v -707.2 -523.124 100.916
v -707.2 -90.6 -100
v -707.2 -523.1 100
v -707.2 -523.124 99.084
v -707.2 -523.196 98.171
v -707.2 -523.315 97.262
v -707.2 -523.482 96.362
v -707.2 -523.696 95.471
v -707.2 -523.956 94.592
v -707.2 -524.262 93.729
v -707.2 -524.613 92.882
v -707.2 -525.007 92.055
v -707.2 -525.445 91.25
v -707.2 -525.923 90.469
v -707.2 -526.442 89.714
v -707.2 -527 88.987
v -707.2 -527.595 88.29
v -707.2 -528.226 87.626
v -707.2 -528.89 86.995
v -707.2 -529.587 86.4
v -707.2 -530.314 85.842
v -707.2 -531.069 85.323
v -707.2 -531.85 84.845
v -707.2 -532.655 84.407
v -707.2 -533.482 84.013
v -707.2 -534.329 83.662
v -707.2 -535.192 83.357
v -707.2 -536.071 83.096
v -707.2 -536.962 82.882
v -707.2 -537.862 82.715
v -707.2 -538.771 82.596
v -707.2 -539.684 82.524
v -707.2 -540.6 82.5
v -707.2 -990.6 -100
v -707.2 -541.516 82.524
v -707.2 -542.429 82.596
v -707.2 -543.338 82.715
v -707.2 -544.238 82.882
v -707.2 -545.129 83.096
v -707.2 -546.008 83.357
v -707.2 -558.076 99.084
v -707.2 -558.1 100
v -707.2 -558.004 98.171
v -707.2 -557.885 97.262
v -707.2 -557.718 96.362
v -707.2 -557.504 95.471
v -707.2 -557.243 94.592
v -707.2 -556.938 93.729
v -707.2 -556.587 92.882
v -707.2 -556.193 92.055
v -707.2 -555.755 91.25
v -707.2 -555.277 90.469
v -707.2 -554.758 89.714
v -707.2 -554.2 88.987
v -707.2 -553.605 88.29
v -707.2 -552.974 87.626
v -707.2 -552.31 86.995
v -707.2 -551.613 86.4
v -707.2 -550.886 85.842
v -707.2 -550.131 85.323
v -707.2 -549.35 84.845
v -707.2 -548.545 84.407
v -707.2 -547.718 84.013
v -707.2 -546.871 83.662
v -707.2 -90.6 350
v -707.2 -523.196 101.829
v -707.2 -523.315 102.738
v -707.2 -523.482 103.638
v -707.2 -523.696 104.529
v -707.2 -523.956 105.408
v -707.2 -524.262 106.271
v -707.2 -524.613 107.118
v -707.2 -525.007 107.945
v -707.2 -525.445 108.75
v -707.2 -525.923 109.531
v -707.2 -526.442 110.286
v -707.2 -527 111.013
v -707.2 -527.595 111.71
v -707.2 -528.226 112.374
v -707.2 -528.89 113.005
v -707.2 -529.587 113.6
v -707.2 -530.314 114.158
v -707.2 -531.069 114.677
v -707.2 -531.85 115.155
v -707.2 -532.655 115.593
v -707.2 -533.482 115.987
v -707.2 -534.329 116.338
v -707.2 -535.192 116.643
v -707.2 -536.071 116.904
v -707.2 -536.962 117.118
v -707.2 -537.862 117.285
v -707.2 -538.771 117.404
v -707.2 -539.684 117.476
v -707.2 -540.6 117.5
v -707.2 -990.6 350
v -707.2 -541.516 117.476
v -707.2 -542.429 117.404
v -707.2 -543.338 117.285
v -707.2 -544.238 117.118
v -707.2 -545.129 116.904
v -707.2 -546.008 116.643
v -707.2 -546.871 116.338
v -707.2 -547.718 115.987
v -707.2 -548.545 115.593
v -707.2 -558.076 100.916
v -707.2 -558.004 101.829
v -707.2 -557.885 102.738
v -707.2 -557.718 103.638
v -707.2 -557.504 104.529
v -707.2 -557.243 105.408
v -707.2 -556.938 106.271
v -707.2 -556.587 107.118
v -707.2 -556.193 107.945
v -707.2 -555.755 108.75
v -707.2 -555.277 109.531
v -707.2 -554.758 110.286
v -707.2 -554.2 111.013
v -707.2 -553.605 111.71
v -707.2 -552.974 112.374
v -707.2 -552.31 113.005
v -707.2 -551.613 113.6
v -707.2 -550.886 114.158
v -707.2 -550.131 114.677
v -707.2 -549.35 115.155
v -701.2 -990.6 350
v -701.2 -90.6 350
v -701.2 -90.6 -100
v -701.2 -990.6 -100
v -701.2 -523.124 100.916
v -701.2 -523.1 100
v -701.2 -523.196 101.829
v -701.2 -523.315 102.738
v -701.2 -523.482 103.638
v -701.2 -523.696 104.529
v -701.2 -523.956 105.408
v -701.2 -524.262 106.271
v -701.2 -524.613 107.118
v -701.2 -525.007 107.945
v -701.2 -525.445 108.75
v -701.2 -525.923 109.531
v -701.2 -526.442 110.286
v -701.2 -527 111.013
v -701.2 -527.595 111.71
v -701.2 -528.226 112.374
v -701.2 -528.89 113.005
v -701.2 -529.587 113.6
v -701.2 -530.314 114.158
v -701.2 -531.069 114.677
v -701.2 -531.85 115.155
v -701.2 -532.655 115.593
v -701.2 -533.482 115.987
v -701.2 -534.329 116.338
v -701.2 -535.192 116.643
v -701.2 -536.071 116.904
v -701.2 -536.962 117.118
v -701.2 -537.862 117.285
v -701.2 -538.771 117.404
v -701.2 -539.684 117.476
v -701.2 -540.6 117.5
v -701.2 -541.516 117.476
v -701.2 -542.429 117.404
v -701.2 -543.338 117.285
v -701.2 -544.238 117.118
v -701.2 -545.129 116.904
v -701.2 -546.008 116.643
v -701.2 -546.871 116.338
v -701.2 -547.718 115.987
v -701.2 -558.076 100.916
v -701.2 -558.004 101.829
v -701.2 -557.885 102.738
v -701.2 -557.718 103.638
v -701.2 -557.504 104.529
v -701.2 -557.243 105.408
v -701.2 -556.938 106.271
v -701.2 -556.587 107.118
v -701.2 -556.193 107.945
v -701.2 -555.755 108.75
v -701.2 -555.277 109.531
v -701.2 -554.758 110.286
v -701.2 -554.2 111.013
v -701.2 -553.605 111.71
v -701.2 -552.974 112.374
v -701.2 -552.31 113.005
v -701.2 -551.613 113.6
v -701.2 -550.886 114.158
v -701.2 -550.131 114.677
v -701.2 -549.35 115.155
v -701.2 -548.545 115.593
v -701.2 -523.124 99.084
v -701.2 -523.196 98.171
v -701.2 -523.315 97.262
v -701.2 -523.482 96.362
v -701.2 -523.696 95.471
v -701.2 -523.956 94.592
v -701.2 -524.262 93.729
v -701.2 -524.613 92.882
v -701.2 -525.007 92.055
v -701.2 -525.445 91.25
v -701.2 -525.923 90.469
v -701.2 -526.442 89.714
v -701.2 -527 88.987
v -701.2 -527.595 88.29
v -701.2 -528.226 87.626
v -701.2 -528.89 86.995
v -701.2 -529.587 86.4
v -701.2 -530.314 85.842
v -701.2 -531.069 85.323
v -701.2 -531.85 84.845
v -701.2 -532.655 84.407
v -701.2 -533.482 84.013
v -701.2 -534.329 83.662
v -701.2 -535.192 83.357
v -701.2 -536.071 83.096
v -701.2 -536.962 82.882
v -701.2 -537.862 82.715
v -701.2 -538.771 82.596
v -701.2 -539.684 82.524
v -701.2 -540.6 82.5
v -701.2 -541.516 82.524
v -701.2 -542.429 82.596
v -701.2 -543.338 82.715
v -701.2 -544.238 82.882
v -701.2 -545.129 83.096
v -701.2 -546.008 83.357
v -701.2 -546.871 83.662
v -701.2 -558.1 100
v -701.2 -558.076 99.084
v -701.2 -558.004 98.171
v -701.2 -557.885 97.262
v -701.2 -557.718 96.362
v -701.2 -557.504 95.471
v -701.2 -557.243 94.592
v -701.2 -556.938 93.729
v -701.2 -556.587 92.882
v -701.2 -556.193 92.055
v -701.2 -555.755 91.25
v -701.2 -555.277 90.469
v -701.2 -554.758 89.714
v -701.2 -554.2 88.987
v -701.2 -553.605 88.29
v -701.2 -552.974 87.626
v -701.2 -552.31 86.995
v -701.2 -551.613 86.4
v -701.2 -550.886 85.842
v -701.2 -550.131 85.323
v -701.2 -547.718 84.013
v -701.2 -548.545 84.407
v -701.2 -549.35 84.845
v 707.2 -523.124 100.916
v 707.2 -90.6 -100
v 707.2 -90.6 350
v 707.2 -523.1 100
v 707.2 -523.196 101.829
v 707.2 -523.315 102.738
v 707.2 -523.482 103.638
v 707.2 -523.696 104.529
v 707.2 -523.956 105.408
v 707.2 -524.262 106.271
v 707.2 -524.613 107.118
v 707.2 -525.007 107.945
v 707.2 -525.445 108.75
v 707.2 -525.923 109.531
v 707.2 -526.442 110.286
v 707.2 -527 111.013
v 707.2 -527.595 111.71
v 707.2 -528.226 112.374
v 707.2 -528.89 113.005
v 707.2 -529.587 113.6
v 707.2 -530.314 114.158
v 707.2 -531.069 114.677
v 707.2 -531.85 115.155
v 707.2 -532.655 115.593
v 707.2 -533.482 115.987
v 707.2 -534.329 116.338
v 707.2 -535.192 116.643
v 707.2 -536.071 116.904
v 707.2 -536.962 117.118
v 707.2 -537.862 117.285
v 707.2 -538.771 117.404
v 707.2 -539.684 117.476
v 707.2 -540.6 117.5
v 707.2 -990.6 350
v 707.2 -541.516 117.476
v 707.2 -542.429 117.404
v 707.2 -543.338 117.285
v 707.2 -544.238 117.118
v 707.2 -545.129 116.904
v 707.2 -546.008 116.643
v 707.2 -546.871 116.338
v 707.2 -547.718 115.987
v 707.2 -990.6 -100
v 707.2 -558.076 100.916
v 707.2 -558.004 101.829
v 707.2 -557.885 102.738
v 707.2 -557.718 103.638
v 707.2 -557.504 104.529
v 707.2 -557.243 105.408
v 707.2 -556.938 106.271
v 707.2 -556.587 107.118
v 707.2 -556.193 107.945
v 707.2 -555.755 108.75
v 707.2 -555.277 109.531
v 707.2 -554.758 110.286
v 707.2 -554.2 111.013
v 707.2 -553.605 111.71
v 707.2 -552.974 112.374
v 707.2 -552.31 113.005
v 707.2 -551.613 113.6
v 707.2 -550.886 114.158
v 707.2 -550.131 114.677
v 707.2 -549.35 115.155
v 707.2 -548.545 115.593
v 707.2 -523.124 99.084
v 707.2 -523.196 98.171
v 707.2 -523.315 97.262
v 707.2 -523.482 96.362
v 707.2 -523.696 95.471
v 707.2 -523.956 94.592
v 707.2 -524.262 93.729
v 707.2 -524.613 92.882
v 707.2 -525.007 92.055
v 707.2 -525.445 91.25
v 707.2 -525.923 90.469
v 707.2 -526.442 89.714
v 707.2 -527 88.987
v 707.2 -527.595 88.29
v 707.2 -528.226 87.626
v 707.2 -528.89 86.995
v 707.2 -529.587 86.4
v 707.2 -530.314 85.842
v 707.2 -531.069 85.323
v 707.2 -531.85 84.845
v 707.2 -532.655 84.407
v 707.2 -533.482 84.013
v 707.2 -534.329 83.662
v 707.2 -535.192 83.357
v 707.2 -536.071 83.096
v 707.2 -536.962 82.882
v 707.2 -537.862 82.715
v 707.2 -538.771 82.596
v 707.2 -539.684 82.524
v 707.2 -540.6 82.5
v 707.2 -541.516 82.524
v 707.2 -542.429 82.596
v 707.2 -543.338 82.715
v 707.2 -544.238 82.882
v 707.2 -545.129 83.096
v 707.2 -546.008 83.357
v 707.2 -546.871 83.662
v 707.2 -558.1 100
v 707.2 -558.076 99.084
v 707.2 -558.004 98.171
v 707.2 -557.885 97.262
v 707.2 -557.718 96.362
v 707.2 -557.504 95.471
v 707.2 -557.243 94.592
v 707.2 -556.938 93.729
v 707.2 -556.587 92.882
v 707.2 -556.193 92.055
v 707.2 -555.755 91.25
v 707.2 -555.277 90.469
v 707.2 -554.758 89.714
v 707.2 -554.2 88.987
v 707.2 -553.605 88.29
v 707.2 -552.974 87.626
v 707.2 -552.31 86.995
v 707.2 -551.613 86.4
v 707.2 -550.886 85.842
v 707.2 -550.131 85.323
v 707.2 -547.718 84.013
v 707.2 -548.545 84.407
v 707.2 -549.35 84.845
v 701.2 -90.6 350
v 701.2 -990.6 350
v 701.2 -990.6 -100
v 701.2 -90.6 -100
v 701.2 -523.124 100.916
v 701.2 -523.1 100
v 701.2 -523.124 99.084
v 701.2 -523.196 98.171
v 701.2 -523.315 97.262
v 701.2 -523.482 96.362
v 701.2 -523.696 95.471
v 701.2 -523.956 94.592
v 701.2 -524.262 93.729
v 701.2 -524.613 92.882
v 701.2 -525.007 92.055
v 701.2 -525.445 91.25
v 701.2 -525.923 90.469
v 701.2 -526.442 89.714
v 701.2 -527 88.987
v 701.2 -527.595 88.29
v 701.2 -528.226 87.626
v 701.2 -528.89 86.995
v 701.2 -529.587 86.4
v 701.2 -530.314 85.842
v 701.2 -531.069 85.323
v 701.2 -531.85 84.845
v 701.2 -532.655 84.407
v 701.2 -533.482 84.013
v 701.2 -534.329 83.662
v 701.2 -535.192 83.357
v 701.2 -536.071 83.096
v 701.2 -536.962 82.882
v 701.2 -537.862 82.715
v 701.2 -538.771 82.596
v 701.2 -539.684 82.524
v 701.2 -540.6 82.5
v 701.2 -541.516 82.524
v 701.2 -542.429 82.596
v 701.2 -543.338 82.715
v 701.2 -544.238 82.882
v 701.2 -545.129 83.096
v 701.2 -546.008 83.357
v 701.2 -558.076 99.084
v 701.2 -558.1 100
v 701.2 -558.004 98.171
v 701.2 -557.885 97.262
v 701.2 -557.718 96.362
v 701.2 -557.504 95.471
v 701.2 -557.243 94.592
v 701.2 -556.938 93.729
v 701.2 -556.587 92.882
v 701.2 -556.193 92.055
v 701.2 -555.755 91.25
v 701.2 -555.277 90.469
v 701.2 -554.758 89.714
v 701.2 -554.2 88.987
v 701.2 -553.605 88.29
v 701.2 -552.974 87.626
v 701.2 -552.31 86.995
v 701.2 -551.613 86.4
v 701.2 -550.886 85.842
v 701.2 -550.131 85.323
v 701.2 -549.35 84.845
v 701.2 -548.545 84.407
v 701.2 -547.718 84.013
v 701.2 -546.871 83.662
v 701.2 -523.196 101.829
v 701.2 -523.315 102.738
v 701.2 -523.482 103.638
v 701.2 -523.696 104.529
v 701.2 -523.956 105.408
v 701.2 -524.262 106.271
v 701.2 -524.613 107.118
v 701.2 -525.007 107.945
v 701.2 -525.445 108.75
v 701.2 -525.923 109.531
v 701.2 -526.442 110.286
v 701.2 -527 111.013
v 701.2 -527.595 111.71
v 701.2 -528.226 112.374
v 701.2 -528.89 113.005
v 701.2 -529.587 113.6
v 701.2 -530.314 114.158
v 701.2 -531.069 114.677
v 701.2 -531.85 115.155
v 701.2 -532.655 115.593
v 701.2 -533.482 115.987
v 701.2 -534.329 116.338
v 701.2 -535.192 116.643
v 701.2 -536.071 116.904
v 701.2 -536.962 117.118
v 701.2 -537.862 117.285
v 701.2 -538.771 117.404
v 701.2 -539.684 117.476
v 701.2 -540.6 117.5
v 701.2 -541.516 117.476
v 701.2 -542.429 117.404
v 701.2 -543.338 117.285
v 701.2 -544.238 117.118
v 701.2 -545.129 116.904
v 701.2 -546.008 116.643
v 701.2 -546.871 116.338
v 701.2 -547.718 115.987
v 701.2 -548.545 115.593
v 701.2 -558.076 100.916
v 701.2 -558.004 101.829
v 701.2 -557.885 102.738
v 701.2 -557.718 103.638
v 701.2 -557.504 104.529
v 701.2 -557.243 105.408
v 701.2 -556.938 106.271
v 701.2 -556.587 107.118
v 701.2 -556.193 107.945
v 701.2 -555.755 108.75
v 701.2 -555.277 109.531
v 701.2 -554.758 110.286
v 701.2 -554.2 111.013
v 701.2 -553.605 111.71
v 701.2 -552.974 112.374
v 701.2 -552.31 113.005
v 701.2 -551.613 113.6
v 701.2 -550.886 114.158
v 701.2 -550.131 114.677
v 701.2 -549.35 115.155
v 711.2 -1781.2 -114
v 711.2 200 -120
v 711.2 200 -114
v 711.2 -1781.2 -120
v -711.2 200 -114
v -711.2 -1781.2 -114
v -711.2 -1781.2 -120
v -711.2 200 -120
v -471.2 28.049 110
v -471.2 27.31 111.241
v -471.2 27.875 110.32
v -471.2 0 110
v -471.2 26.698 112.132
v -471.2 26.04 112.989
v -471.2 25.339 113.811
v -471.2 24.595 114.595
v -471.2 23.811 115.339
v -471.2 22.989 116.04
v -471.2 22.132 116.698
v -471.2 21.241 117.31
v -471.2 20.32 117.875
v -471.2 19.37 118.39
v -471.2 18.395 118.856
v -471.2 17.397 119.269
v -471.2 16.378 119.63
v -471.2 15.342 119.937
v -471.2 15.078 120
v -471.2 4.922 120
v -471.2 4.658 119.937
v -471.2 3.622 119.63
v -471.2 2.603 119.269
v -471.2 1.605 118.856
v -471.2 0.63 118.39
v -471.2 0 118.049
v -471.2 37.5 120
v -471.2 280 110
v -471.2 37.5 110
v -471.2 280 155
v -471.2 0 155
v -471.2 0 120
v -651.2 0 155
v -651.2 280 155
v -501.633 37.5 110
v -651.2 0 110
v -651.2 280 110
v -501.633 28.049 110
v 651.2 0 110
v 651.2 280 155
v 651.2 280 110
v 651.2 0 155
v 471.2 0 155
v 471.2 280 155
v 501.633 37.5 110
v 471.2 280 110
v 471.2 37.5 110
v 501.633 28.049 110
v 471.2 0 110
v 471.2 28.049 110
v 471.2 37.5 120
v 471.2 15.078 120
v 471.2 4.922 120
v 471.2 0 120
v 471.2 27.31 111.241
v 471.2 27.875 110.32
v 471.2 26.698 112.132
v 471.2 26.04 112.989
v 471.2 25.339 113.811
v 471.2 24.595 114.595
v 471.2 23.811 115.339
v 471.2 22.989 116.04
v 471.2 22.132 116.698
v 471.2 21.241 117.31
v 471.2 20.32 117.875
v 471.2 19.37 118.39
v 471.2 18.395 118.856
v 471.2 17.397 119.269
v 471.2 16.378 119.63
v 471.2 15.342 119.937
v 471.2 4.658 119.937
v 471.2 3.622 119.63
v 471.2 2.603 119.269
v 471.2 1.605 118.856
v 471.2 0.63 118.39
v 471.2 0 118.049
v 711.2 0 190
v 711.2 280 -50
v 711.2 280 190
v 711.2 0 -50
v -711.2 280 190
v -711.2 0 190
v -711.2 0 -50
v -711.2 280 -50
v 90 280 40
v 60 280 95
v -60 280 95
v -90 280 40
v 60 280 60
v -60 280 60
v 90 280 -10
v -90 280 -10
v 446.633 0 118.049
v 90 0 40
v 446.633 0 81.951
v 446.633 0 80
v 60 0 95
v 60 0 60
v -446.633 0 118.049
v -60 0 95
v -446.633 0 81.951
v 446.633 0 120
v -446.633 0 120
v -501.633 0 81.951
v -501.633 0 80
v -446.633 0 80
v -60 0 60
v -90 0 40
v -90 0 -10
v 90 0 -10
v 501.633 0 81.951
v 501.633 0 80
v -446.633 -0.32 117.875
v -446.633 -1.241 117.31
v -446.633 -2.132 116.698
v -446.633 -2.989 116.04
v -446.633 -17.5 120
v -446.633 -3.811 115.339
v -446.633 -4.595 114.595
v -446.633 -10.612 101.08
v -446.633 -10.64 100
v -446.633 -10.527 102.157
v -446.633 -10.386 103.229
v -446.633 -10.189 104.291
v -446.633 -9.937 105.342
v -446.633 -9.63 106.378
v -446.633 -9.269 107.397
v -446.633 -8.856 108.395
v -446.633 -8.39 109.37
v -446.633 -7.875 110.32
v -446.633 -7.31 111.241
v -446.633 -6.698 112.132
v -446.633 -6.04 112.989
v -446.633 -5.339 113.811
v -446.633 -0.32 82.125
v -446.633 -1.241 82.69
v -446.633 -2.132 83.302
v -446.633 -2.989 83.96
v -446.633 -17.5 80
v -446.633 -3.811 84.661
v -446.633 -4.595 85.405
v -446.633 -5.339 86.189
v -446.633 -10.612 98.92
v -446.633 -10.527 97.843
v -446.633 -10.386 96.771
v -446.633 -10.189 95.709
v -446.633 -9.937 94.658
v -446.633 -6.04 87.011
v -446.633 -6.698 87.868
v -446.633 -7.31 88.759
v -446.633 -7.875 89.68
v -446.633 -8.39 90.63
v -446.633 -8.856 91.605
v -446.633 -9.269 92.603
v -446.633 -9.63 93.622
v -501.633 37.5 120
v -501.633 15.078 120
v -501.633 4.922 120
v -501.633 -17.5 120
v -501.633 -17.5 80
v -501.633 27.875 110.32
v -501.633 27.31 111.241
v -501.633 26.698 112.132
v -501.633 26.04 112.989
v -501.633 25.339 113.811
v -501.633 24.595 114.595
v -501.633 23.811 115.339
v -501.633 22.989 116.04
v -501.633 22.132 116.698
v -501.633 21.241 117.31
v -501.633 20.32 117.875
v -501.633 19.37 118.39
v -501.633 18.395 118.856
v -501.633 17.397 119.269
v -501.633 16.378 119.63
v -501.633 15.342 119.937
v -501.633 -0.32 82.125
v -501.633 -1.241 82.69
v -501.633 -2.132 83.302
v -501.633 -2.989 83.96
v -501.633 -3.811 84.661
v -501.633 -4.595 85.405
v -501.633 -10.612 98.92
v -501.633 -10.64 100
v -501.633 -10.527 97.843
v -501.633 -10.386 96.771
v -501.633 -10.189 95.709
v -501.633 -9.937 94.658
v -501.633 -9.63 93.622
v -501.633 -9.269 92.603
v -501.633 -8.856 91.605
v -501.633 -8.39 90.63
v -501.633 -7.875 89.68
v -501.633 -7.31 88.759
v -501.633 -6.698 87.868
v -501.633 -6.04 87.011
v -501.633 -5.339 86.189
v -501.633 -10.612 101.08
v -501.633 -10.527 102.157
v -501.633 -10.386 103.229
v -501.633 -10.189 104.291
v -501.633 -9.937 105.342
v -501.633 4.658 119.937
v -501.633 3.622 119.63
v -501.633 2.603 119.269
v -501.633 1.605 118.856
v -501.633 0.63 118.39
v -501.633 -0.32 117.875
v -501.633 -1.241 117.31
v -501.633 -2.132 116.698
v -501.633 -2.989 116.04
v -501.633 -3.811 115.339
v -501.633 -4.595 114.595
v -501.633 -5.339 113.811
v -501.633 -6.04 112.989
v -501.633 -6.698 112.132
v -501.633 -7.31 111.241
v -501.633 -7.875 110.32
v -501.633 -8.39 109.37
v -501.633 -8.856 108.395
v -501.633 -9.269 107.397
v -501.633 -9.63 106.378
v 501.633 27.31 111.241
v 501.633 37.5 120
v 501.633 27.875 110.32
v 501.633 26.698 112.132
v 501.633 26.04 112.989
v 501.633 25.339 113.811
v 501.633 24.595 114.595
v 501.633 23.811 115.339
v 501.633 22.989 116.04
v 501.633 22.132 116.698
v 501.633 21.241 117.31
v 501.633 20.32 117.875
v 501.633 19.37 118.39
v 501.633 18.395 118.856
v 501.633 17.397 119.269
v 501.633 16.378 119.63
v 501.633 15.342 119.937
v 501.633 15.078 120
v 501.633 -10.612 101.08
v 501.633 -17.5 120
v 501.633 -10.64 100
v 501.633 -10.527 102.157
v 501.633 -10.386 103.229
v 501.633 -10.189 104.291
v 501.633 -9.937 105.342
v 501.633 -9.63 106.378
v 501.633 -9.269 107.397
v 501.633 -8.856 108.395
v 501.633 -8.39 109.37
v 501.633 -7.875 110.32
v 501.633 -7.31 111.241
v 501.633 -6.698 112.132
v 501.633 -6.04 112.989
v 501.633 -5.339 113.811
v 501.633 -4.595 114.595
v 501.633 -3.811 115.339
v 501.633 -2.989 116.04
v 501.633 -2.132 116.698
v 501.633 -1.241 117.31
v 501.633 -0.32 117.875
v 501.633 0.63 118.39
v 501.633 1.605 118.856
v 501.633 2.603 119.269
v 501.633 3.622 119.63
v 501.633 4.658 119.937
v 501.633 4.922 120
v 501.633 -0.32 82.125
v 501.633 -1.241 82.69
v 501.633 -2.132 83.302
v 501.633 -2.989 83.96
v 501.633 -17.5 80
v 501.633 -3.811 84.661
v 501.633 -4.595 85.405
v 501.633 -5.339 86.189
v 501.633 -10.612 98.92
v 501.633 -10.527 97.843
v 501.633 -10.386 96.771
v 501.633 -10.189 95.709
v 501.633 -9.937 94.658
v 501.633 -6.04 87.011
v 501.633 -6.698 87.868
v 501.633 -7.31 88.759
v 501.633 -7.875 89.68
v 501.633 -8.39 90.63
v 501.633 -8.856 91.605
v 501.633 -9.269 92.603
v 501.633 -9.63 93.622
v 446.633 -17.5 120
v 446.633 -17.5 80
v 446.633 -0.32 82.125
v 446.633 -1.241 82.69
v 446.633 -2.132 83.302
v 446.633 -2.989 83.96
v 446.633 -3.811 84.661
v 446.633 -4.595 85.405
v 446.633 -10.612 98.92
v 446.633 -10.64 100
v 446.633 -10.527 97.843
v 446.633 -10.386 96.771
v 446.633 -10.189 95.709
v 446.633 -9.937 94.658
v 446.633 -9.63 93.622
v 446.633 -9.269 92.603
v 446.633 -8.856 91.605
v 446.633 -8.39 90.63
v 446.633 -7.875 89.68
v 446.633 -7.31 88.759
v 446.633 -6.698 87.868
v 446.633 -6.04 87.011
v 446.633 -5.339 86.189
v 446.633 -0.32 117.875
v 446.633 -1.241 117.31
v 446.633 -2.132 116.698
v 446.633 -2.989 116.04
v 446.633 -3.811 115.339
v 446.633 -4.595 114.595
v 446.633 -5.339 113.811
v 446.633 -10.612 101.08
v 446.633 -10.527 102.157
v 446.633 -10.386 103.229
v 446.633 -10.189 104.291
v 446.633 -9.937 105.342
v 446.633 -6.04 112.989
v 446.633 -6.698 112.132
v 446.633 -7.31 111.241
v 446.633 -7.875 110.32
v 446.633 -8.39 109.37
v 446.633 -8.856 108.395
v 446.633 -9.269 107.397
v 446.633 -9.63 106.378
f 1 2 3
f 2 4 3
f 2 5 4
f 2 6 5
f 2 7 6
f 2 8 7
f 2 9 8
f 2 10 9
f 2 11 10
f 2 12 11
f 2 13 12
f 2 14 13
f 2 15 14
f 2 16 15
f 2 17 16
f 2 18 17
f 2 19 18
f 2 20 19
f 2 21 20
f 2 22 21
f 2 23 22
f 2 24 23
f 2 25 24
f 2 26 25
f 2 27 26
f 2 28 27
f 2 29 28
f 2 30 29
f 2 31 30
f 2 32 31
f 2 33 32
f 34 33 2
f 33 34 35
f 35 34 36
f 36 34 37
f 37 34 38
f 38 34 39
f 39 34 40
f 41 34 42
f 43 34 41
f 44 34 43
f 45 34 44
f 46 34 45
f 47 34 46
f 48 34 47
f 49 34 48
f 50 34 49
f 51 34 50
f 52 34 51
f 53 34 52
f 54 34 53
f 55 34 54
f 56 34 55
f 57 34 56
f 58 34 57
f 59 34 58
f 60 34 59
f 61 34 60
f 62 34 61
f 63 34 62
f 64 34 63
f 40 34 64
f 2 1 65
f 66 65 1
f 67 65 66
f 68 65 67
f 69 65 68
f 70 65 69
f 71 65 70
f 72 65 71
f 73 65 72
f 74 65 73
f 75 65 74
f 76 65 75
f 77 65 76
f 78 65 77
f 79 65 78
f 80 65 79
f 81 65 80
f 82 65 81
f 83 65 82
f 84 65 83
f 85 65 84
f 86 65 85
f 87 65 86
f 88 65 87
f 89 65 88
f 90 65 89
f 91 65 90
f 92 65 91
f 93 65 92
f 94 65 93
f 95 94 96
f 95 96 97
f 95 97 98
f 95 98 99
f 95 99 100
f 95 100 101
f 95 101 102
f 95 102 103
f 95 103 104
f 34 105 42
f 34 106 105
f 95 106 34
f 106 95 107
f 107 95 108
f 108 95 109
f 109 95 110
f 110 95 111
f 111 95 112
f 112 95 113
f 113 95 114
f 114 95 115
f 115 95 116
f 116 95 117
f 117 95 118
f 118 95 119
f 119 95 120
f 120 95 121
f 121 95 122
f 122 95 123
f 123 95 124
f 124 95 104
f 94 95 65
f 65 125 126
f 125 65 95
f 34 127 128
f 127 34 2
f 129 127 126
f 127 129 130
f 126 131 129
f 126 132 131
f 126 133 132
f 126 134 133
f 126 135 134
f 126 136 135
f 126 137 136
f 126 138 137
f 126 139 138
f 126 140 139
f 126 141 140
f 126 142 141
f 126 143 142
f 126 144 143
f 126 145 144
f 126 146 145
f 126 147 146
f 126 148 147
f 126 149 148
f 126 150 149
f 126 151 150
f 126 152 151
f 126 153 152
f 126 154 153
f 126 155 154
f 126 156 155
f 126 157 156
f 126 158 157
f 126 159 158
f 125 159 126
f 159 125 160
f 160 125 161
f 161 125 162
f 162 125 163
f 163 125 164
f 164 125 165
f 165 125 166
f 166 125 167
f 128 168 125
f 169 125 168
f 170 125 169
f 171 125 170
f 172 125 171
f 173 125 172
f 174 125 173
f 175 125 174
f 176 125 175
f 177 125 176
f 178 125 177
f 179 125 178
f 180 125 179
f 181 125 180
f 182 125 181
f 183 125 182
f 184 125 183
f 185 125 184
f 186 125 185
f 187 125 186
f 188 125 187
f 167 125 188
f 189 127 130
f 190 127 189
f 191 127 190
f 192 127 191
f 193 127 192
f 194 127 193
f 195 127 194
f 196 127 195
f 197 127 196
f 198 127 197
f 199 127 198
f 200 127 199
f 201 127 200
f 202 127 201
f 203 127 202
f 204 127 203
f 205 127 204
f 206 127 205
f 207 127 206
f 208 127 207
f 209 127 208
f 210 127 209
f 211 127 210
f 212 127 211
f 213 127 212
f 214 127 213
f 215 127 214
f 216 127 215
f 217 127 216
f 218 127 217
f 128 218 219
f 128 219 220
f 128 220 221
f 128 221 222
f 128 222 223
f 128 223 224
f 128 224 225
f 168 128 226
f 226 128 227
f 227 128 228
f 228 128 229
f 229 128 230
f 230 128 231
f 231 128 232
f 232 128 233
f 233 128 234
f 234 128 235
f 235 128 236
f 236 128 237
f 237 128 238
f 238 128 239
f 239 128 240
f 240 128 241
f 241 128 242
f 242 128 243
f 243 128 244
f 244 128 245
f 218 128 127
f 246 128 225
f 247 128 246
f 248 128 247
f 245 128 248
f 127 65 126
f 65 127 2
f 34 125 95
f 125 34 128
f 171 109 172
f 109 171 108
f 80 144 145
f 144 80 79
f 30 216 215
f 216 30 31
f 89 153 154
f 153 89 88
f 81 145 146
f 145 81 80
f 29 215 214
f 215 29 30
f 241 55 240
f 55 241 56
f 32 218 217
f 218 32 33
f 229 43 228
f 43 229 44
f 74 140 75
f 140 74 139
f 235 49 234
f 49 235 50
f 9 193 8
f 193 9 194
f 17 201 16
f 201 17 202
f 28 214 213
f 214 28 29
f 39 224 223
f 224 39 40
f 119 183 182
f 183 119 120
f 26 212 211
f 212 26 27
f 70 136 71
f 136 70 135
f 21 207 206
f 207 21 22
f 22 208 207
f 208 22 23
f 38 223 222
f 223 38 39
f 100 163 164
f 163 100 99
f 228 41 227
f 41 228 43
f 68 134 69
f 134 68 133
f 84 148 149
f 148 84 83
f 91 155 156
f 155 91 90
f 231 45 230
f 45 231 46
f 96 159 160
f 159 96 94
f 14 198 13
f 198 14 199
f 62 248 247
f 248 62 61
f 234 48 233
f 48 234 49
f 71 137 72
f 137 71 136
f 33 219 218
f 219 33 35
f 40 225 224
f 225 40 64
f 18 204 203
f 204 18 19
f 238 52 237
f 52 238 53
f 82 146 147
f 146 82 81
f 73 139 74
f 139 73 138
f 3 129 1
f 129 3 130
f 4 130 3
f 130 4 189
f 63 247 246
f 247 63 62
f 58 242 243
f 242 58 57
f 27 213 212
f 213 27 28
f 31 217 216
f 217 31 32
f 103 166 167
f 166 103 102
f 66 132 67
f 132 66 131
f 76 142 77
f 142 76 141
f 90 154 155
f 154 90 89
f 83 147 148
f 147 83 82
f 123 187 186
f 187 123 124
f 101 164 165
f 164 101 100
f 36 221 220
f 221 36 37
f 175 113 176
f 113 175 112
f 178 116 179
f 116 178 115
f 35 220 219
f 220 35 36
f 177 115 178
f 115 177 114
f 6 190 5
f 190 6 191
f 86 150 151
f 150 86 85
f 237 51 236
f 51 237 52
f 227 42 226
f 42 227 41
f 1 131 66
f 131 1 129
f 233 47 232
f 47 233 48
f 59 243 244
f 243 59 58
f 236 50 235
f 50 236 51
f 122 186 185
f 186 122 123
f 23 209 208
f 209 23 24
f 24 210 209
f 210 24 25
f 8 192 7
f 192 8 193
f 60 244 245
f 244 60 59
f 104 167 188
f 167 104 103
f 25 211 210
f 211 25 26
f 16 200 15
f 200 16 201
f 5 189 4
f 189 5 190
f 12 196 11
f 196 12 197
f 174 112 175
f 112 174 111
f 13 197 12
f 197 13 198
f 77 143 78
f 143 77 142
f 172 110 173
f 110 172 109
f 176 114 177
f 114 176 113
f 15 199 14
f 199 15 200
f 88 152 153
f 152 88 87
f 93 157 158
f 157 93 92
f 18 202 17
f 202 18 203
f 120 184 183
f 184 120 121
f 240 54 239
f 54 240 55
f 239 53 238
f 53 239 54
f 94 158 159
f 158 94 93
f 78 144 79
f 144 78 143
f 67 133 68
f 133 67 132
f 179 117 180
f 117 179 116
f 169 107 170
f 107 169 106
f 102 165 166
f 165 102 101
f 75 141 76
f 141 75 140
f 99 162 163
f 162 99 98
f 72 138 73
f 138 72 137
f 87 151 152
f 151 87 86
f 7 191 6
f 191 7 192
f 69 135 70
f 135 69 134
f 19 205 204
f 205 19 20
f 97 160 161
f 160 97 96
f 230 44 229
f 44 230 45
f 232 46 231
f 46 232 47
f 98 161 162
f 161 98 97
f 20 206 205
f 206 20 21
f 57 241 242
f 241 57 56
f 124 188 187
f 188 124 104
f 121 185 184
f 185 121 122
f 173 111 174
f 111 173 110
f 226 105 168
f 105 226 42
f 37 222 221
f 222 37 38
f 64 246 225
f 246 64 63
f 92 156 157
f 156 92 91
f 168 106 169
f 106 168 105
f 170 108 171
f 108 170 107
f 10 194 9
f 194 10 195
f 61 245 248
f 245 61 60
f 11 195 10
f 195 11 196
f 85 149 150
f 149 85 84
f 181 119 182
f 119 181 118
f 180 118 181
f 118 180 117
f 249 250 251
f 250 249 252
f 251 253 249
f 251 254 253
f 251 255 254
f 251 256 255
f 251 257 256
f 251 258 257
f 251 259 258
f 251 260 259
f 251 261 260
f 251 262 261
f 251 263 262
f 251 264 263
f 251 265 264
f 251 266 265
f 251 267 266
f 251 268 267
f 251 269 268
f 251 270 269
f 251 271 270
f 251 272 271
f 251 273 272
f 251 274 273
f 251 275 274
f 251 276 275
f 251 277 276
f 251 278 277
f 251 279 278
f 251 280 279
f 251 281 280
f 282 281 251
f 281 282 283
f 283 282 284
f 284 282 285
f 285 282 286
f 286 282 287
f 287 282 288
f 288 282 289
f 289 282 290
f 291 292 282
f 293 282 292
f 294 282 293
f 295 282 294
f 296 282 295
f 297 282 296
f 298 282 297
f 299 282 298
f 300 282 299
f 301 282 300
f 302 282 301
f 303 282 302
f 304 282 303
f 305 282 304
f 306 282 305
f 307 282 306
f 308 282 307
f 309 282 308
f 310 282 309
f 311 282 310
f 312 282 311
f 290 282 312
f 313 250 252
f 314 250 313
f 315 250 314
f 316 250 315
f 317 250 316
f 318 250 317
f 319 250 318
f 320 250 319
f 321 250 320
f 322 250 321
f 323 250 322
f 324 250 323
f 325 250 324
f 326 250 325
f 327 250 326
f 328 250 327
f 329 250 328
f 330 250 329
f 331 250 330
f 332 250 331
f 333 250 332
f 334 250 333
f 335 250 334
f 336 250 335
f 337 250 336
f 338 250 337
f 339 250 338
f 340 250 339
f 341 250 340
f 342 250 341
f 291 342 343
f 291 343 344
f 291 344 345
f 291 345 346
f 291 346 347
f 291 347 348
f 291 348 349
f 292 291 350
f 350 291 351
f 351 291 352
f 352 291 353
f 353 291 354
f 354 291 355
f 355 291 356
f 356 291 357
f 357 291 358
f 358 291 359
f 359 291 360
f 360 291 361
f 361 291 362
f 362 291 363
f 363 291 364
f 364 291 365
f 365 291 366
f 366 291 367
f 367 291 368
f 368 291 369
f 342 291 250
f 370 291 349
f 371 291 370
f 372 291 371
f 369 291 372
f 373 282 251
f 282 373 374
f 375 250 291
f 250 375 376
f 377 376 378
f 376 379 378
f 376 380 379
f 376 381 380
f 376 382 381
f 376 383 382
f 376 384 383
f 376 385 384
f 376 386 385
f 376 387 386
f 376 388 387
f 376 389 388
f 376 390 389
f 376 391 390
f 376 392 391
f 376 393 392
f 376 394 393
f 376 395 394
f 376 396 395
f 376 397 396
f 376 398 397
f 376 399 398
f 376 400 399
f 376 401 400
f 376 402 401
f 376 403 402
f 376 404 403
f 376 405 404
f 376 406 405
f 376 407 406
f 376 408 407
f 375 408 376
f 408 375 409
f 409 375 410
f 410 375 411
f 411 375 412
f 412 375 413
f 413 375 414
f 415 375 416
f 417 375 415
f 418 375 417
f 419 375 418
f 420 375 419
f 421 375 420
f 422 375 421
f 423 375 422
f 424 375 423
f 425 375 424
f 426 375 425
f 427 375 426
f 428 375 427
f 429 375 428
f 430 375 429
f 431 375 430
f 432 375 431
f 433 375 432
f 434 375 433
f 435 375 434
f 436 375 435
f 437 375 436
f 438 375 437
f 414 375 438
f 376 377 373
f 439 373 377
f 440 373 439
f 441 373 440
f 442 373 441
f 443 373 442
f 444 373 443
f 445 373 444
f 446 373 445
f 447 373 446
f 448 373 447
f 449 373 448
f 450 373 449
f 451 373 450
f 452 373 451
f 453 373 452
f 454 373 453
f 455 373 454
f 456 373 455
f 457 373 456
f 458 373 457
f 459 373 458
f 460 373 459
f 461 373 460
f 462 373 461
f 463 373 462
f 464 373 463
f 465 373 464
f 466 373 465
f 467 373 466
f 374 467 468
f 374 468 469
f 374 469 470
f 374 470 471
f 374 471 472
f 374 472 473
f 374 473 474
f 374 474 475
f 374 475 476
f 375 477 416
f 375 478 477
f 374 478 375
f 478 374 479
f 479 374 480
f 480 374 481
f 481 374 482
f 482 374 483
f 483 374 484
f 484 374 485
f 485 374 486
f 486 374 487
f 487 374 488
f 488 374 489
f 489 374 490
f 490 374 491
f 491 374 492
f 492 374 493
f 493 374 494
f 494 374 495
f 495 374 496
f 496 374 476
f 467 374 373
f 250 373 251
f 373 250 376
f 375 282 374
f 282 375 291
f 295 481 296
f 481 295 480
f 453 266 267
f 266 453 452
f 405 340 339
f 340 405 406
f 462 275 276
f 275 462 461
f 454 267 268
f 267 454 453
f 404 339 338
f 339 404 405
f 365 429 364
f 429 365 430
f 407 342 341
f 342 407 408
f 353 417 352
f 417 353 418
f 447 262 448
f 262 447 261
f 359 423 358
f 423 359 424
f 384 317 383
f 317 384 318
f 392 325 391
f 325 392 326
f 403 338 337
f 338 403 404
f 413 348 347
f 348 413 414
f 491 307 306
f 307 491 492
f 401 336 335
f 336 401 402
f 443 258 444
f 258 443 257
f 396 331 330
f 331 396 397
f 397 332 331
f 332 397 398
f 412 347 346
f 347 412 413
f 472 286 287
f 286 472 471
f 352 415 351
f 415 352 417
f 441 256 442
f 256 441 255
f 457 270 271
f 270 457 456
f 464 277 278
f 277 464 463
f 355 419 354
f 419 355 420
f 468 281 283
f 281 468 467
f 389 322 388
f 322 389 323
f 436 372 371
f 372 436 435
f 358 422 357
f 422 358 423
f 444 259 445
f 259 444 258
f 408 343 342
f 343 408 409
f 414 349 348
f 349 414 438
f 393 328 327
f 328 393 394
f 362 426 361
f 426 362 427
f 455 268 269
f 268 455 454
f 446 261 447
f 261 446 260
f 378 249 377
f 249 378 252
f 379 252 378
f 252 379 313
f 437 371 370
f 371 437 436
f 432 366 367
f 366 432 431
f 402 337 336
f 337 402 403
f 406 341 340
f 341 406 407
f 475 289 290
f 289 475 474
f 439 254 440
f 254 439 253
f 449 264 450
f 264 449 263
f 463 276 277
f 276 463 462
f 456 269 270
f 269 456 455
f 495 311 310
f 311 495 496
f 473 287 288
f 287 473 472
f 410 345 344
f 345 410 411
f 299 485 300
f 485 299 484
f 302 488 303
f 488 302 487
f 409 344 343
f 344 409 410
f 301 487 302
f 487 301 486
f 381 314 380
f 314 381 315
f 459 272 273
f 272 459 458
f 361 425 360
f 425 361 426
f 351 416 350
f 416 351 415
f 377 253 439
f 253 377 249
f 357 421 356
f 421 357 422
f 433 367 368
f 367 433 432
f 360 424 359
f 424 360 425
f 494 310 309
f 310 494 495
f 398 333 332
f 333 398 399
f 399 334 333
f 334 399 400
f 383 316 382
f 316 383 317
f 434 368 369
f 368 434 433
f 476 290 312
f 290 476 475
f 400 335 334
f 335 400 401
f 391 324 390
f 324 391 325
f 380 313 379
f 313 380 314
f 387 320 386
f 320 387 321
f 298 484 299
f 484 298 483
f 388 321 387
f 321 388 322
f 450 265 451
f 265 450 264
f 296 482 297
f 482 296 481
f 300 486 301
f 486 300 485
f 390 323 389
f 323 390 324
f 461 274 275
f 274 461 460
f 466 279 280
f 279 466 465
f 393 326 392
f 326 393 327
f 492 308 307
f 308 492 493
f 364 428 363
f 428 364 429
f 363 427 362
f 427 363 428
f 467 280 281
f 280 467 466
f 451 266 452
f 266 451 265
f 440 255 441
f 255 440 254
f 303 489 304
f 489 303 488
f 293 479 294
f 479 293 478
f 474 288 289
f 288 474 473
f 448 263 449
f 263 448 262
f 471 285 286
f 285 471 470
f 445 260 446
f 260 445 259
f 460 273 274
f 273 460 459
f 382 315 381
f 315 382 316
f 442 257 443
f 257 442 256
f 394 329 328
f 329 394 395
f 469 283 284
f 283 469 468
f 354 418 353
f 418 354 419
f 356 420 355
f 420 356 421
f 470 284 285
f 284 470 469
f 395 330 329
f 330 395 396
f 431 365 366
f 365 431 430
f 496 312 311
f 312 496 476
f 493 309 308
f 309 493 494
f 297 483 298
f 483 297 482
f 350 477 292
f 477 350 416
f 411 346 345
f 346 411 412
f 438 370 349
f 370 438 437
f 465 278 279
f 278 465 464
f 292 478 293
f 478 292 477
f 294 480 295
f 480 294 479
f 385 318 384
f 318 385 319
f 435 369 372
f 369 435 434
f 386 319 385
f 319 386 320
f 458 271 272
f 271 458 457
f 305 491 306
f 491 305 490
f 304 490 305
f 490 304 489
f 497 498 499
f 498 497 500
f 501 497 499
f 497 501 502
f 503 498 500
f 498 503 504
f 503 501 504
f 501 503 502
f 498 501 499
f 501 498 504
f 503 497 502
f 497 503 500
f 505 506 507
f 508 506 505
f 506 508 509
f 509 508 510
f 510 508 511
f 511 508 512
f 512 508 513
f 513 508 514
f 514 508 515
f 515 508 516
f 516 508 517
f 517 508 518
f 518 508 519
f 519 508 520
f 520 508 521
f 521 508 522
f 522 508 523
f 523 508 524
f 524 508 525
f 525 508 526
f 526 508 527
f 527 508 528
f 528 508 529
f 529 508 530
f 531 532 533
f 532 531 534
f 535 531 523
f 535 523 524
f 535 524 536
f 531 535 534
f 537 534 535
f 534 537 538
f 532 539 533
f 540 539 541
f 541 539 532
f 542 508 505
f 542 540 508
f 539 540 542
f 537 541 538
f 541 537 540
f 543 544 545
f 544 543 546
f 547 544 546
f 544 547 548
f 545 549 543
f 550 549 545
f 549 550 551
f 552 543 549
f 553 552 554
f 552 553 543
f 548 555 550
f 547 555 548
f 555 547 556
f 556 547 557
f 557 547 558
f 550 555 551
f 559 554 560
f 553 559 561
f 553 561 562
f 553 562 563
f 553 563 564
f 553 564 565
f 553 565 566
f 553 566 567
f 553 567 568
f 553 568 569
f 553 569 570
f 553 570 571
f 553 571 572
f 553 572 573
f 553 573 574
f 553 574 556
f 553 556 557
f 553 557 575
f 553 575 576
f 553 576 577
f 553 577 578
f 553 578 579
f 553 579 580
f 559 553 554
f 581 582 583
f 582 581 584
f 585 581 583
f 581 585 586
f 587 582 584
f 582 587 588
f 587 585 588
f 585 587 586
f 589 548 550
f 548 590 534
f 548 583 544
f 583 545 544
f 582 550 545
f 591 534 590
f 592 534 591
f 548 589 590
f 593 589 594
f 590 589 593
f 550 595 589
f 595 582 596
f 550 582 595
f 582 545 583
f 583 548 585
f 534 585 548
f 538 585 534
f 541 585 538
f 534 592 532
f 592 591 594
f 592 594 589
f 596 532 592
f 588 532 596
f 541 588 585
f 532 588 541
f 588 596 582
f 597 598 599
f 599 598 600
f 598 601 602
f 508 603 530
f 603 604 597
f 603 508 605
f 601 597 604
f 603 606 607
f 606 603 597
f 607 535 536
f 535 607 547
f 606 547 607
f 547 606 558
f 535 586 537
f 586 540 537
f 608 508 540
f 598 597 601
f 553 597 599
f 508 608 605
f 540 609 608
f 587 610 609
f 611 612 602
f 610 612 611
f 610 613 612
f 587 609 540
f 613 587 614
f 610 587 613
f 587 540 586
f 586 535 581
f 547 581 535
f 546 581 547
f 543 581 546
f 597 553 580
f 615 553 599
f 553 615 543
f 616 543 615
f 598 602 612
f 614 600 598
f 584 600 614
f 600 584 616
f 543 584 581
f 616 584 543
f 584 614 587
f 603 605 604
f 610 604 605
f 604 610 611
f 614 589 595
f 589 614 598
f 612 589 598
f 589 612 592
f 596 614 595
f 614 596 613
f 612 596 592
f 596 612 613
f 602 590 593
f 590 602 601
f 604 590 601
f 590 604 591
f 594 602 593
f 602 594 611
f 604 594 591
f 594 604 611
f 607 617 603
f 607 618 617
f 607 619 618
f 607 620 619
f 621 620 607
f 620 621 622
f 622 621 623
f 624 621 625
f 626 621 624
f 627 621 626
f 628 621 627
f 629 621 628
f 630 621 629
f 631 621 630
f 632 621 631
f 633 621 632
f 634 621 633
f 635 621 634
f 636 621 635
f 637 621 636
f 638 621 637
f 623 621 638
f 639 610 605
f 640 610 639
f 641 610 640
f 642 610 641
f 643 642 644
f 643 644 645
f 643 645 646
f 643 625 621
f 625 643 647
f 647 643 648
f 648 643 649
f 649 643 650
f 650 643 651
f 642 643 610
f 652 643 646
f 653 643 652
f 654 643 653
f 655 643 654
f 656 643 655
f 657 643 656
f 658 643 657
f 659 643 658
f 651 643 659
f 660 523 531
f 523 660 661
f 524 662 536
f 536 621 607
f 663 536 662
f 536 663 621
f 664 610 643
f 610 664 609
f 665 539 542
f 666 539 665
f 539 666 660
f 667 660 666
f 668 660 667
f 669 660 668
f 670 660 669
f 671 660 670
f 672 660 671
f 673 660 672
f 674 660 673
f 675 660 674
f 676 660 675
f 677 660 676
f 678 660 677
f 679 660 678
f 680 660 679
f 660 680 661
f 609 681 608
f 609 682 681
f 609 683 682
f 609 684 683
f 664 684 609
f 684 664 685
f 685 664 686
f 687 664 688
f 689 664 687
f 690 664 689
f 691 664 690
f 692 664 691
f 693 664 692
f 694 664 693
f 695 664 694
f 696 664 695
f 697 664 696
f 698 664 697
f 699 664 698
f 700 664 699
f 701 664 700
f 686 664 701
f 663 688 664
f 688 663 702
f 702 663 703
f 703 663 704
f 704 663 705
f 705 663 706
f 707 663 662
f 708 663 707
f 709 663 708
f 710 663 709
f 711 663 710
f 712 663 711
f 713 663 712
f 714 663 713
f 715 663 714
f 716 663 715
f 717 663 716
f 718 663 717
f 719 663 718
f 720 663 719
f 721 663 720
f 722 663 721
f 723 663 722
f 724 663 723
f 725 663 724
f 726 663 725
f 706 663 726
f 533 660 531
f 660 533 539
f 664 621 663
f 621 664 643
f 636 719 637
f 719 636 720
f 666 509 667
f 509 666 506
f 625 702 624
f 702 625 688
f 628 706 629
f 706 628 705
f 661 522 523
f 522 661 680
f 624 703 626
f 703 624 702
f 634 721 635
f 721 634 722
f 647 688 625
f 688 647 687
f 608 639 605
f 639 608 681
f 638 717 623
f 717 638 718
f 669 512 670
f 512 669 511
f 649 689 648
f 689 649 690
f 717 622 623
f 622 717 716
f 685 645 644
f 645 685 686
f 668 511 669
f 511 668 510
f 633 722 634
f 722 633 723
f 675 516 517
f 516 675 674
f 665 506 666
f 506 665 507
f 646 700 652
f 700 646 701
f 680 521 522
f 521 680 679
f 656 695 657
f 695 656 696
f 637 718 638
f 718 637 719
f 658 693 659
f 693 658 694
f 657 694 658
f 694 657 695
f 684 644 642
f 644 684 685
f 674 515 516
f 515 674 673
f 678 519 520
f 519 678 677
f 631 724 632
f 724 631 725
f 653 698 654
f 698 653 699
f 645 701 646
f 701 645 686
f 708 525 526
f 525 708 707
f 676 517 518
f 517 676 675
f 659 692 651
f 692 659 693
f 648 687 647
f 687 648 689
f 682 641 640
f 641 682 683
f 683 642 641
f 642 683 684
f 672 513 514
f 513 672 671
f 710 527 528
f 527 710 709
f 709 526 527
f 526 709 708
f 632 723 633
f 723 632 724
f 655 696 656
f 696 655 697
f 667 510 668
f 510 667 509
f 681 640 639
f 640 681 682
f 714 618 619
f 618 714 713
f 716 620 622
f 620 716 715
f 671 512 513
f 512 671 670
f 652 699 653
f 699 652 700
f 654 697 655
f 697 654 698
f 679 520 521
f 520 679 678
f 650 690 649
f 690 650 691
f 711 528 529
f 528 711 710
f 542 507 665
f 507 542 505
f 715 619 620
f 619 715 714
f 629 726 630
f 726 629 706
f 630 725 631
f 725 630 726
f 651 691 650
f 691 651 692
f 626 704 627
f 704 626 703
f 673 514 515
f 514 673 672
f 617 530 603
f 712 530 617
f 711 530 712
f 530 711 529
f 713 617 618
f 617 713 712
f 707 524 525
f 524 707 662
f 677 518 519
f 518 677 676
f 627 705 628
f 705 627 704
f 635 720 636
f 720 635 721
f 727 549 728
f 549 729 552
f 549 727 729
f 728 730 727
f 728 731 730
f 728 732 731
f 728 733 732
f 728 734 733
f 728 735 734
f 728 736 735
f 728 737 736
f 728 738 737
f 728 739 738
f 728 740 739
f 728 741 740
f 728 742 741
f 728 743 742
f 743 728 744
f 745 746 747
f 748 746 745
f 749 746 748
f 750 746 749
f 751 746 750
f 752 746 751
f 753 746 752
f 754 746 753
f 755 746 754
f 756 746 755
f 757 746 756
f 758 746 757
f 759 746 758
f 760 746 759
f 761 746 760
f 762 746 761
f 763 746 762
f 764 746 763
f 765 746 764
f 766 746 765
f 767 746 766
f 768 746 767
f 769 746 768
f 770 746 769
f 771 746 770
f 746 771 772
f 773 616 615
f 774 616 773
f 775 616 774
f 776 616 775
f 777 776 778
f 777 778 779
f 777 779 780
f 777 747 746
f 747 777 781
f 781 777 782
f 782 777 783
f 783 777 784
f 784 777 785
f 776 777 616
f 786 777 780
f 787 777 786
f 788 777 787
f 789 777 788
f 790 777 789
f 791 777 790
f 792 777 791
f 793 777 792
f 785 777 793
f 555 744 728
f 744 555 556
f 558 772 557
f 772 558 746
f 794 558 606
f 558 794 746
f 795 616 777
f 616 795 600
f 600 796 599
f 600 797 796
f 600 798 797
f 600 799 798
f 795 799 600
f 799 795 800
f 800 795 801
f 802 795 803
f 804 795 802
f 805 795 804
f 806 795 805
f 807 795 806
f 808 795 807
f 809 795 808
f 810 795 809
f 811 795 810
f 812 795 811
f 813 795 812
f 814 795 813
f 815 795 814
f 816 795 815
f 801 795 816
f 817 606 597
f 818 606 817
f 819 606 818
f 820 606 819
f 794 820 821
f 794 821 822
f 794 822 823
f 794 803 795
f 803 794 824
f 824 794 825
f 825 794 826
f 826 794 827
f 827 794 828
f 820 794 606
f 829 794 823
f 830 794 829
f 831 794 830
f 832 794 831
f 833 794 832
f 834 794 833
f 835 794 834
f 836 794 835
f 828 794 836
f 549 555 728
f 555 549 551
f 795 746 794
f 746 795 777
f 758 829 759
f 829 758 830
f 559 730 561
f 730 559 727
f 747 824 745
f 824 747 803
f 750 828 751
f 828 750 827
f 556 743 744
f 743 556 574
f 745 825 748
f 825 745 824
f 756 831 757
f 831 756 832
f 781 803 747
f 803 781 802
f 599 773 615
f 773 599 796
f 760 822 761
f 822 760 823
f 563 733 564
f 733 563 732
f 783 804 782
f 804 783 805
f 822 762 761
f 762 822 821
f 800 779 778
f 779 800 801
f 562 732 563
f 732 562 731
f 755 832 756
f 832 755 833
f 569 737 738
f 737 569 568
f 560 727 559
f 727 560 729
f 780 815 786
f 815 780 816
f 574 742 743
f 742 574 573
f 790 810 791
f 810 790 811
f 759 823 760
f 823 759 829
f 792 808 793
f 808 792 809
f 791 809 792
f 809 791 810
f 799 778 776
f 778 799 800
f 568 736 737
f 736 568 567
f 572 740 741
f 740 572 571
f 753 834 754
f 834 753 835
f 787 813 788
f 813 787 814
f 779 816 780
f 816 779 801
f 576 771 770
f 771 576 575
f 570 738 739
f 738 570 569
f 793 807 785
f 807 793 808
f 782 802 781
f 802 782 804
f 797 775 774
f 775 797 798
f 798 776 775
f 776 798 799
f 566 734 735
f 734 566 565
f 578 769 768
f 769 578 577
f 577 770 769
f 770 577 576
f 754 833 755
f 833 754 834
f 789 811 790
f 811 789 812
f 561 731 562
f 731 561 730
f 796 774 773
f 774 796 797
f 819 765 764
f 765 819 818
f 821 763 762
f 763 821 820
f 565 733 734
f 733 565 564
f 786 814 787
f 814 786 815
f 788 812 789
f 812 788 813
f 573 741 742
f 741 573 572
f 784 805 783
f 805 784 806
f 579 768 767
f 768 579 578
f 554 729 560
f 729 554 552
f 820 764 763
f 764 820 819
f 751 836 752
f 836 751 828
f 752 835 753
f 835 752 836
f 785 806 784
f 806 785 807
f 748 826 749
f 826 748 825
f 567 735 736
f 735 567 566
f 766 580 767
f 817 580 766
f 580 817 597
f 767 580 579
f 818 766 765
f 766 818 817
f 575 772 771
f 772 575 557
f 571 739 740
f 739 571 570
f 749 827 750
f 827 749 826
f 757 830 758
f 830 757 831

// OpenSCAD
// ====================================================================================
// REVOLUTIONARY TECHNOLOGY COMPANY & UNIVERSITY OF WASHINGTON DEPARTMENT OF PHYSICS
// Subsystem: otterbox_master_interior.scad (Unified Dual-Density Cockpit Shell)
// Core Partner: OtterBox Custom Automotive Interior Systems Division
// Center Origin (0,0,0) = Firewall Center point along Driveline Longitudinal Axis
// ====================================================================================

$fn = 120; // High-fidelity injection-mold tooling path resolution

// --- Core Structural Constraints (mm) ---
inch_to_mm         = 25.4;
cabin_width        = 56.0 * inch_to_mm;  // 1422.4 mm internal roof taper clearance
cabin_length       = 78.0 * inch_to_mm;  // 1981.2 mm longitudinal floor bed depth
shell_thickness_pc = 6.00;               // Structural Polycarbonate hard backing core
skin_thickness_tpu = 4.00;               // Impact-dissipating soft-touch rubber wrap

// Standardized Component clearance Pockets
din_radio_width    = 180.00;             // Standard DIN radio unit horizontal cutout room
din_radio_height   = 50.00;              // Standard DIN radio vertical clearance room
peltier_hvac_w     = 180.00;             // Fits copo_peltier_hvac.scad alignment core
dial_panel_w       = 120.00;             // Room for authentic 1969 sliding control sliders

module otterbox_floor_and_doors() {
    echo("COMPILING INTEGRATED OTTERBOX MULTI-MATERIAL INTERIOR MATRIX");
    // 1. FLOOR COVER PAN: Molded piece lining the frame rails to damp track vibration
    color("DarkCharcoal") {
        translate([-cabin_width/2, -cabin_length + 200, -120])
            cube([cabin_width, cabin_length, shell_thickness_pc]);
    }
    
    // 2. INNER DOOR SKINS: Hollowed to clear the aerospace manual window cables
    color("Black") {
        for (side = [-1, 1]) {
            scale([side, 1, 1])
                translate([cabin_width/2 - 10, -cabin_length/2, -100])
                    difference() {
                        cube([shell_thickness_pc, 900, 450]);
                        // Circular clearance bore to mount the 1969 hand-crank handle shaft
                        translate([-1, 450, 200])
                            rotate([0, 90, 0])
                                cylinder(d=35.0, h=shell_thickness_pc + 4);
                    }
        }
    }
}

module otterbox_integrated_dash() {
    // 3. MASTER DASHBOARD PANEL: Connects the Peltier AC vents, LED pods, and radio bay
    color("DimGrey") {
        translate([-cabin_width/2, 0, -50]) {
            difference() {
                // Main dashboard upper structure fascia block
                cube([cabin_width, 280, 240]);
                
                // CENTER CONSOLE RADIO STORAGE OPENING: Standard room left for new radio equipment
                translate([cabin_width/2 - din_radio_width/2, -1, 40])
                    cube([din_radio_width, 282, din_radio_height]);
                
                // 1969 MECHANICAL SLIDER CONTROL SWITCH POCKET
                translate([cabin_width/2 - dial_panel_w/2, -1, 110])
                    cube([dial_panel_w, 282, 35]);
                
                // SOLID-STATE PELTIER AC DUCT VENT HOUSINGS (Left and Right airflow routes)
                for (x = [60, cabin_width - 60 - peltier_hvac_w]) {
                    translate([x, -1, 160])
                        cube([peltier_hvac_w, 282, 45]);
                }
            }
        }
    }
}

module cage_retention_clamps() {
    // OtterBox-designed heavy-duty interlocking wrap-clamps.
    // Snaps directly onto the roll bars to eliminate interior noise or rattle under load.
    for (x_offset = [-cabin_width/3, cabin_width/3]) {
        translate([x_offset, 10, 100]) {
            color("Black") {
                difference() {
                    cube([55, 55, 40], center=true);
                    // Clamps tight to standard 1-5/8" (41.275mm) cage tubes
                    rotate([0, 90, 0])
                        cylinder(d=41.28, h=60, center=true);
                }
            }
        }
    }
}

// --- Composite Master Interior Integration Instantiation ---
union() {
    otterbox_floor_and_doors();
    otterbox_integrated_dash();
    cage_retention_clamps();
}
